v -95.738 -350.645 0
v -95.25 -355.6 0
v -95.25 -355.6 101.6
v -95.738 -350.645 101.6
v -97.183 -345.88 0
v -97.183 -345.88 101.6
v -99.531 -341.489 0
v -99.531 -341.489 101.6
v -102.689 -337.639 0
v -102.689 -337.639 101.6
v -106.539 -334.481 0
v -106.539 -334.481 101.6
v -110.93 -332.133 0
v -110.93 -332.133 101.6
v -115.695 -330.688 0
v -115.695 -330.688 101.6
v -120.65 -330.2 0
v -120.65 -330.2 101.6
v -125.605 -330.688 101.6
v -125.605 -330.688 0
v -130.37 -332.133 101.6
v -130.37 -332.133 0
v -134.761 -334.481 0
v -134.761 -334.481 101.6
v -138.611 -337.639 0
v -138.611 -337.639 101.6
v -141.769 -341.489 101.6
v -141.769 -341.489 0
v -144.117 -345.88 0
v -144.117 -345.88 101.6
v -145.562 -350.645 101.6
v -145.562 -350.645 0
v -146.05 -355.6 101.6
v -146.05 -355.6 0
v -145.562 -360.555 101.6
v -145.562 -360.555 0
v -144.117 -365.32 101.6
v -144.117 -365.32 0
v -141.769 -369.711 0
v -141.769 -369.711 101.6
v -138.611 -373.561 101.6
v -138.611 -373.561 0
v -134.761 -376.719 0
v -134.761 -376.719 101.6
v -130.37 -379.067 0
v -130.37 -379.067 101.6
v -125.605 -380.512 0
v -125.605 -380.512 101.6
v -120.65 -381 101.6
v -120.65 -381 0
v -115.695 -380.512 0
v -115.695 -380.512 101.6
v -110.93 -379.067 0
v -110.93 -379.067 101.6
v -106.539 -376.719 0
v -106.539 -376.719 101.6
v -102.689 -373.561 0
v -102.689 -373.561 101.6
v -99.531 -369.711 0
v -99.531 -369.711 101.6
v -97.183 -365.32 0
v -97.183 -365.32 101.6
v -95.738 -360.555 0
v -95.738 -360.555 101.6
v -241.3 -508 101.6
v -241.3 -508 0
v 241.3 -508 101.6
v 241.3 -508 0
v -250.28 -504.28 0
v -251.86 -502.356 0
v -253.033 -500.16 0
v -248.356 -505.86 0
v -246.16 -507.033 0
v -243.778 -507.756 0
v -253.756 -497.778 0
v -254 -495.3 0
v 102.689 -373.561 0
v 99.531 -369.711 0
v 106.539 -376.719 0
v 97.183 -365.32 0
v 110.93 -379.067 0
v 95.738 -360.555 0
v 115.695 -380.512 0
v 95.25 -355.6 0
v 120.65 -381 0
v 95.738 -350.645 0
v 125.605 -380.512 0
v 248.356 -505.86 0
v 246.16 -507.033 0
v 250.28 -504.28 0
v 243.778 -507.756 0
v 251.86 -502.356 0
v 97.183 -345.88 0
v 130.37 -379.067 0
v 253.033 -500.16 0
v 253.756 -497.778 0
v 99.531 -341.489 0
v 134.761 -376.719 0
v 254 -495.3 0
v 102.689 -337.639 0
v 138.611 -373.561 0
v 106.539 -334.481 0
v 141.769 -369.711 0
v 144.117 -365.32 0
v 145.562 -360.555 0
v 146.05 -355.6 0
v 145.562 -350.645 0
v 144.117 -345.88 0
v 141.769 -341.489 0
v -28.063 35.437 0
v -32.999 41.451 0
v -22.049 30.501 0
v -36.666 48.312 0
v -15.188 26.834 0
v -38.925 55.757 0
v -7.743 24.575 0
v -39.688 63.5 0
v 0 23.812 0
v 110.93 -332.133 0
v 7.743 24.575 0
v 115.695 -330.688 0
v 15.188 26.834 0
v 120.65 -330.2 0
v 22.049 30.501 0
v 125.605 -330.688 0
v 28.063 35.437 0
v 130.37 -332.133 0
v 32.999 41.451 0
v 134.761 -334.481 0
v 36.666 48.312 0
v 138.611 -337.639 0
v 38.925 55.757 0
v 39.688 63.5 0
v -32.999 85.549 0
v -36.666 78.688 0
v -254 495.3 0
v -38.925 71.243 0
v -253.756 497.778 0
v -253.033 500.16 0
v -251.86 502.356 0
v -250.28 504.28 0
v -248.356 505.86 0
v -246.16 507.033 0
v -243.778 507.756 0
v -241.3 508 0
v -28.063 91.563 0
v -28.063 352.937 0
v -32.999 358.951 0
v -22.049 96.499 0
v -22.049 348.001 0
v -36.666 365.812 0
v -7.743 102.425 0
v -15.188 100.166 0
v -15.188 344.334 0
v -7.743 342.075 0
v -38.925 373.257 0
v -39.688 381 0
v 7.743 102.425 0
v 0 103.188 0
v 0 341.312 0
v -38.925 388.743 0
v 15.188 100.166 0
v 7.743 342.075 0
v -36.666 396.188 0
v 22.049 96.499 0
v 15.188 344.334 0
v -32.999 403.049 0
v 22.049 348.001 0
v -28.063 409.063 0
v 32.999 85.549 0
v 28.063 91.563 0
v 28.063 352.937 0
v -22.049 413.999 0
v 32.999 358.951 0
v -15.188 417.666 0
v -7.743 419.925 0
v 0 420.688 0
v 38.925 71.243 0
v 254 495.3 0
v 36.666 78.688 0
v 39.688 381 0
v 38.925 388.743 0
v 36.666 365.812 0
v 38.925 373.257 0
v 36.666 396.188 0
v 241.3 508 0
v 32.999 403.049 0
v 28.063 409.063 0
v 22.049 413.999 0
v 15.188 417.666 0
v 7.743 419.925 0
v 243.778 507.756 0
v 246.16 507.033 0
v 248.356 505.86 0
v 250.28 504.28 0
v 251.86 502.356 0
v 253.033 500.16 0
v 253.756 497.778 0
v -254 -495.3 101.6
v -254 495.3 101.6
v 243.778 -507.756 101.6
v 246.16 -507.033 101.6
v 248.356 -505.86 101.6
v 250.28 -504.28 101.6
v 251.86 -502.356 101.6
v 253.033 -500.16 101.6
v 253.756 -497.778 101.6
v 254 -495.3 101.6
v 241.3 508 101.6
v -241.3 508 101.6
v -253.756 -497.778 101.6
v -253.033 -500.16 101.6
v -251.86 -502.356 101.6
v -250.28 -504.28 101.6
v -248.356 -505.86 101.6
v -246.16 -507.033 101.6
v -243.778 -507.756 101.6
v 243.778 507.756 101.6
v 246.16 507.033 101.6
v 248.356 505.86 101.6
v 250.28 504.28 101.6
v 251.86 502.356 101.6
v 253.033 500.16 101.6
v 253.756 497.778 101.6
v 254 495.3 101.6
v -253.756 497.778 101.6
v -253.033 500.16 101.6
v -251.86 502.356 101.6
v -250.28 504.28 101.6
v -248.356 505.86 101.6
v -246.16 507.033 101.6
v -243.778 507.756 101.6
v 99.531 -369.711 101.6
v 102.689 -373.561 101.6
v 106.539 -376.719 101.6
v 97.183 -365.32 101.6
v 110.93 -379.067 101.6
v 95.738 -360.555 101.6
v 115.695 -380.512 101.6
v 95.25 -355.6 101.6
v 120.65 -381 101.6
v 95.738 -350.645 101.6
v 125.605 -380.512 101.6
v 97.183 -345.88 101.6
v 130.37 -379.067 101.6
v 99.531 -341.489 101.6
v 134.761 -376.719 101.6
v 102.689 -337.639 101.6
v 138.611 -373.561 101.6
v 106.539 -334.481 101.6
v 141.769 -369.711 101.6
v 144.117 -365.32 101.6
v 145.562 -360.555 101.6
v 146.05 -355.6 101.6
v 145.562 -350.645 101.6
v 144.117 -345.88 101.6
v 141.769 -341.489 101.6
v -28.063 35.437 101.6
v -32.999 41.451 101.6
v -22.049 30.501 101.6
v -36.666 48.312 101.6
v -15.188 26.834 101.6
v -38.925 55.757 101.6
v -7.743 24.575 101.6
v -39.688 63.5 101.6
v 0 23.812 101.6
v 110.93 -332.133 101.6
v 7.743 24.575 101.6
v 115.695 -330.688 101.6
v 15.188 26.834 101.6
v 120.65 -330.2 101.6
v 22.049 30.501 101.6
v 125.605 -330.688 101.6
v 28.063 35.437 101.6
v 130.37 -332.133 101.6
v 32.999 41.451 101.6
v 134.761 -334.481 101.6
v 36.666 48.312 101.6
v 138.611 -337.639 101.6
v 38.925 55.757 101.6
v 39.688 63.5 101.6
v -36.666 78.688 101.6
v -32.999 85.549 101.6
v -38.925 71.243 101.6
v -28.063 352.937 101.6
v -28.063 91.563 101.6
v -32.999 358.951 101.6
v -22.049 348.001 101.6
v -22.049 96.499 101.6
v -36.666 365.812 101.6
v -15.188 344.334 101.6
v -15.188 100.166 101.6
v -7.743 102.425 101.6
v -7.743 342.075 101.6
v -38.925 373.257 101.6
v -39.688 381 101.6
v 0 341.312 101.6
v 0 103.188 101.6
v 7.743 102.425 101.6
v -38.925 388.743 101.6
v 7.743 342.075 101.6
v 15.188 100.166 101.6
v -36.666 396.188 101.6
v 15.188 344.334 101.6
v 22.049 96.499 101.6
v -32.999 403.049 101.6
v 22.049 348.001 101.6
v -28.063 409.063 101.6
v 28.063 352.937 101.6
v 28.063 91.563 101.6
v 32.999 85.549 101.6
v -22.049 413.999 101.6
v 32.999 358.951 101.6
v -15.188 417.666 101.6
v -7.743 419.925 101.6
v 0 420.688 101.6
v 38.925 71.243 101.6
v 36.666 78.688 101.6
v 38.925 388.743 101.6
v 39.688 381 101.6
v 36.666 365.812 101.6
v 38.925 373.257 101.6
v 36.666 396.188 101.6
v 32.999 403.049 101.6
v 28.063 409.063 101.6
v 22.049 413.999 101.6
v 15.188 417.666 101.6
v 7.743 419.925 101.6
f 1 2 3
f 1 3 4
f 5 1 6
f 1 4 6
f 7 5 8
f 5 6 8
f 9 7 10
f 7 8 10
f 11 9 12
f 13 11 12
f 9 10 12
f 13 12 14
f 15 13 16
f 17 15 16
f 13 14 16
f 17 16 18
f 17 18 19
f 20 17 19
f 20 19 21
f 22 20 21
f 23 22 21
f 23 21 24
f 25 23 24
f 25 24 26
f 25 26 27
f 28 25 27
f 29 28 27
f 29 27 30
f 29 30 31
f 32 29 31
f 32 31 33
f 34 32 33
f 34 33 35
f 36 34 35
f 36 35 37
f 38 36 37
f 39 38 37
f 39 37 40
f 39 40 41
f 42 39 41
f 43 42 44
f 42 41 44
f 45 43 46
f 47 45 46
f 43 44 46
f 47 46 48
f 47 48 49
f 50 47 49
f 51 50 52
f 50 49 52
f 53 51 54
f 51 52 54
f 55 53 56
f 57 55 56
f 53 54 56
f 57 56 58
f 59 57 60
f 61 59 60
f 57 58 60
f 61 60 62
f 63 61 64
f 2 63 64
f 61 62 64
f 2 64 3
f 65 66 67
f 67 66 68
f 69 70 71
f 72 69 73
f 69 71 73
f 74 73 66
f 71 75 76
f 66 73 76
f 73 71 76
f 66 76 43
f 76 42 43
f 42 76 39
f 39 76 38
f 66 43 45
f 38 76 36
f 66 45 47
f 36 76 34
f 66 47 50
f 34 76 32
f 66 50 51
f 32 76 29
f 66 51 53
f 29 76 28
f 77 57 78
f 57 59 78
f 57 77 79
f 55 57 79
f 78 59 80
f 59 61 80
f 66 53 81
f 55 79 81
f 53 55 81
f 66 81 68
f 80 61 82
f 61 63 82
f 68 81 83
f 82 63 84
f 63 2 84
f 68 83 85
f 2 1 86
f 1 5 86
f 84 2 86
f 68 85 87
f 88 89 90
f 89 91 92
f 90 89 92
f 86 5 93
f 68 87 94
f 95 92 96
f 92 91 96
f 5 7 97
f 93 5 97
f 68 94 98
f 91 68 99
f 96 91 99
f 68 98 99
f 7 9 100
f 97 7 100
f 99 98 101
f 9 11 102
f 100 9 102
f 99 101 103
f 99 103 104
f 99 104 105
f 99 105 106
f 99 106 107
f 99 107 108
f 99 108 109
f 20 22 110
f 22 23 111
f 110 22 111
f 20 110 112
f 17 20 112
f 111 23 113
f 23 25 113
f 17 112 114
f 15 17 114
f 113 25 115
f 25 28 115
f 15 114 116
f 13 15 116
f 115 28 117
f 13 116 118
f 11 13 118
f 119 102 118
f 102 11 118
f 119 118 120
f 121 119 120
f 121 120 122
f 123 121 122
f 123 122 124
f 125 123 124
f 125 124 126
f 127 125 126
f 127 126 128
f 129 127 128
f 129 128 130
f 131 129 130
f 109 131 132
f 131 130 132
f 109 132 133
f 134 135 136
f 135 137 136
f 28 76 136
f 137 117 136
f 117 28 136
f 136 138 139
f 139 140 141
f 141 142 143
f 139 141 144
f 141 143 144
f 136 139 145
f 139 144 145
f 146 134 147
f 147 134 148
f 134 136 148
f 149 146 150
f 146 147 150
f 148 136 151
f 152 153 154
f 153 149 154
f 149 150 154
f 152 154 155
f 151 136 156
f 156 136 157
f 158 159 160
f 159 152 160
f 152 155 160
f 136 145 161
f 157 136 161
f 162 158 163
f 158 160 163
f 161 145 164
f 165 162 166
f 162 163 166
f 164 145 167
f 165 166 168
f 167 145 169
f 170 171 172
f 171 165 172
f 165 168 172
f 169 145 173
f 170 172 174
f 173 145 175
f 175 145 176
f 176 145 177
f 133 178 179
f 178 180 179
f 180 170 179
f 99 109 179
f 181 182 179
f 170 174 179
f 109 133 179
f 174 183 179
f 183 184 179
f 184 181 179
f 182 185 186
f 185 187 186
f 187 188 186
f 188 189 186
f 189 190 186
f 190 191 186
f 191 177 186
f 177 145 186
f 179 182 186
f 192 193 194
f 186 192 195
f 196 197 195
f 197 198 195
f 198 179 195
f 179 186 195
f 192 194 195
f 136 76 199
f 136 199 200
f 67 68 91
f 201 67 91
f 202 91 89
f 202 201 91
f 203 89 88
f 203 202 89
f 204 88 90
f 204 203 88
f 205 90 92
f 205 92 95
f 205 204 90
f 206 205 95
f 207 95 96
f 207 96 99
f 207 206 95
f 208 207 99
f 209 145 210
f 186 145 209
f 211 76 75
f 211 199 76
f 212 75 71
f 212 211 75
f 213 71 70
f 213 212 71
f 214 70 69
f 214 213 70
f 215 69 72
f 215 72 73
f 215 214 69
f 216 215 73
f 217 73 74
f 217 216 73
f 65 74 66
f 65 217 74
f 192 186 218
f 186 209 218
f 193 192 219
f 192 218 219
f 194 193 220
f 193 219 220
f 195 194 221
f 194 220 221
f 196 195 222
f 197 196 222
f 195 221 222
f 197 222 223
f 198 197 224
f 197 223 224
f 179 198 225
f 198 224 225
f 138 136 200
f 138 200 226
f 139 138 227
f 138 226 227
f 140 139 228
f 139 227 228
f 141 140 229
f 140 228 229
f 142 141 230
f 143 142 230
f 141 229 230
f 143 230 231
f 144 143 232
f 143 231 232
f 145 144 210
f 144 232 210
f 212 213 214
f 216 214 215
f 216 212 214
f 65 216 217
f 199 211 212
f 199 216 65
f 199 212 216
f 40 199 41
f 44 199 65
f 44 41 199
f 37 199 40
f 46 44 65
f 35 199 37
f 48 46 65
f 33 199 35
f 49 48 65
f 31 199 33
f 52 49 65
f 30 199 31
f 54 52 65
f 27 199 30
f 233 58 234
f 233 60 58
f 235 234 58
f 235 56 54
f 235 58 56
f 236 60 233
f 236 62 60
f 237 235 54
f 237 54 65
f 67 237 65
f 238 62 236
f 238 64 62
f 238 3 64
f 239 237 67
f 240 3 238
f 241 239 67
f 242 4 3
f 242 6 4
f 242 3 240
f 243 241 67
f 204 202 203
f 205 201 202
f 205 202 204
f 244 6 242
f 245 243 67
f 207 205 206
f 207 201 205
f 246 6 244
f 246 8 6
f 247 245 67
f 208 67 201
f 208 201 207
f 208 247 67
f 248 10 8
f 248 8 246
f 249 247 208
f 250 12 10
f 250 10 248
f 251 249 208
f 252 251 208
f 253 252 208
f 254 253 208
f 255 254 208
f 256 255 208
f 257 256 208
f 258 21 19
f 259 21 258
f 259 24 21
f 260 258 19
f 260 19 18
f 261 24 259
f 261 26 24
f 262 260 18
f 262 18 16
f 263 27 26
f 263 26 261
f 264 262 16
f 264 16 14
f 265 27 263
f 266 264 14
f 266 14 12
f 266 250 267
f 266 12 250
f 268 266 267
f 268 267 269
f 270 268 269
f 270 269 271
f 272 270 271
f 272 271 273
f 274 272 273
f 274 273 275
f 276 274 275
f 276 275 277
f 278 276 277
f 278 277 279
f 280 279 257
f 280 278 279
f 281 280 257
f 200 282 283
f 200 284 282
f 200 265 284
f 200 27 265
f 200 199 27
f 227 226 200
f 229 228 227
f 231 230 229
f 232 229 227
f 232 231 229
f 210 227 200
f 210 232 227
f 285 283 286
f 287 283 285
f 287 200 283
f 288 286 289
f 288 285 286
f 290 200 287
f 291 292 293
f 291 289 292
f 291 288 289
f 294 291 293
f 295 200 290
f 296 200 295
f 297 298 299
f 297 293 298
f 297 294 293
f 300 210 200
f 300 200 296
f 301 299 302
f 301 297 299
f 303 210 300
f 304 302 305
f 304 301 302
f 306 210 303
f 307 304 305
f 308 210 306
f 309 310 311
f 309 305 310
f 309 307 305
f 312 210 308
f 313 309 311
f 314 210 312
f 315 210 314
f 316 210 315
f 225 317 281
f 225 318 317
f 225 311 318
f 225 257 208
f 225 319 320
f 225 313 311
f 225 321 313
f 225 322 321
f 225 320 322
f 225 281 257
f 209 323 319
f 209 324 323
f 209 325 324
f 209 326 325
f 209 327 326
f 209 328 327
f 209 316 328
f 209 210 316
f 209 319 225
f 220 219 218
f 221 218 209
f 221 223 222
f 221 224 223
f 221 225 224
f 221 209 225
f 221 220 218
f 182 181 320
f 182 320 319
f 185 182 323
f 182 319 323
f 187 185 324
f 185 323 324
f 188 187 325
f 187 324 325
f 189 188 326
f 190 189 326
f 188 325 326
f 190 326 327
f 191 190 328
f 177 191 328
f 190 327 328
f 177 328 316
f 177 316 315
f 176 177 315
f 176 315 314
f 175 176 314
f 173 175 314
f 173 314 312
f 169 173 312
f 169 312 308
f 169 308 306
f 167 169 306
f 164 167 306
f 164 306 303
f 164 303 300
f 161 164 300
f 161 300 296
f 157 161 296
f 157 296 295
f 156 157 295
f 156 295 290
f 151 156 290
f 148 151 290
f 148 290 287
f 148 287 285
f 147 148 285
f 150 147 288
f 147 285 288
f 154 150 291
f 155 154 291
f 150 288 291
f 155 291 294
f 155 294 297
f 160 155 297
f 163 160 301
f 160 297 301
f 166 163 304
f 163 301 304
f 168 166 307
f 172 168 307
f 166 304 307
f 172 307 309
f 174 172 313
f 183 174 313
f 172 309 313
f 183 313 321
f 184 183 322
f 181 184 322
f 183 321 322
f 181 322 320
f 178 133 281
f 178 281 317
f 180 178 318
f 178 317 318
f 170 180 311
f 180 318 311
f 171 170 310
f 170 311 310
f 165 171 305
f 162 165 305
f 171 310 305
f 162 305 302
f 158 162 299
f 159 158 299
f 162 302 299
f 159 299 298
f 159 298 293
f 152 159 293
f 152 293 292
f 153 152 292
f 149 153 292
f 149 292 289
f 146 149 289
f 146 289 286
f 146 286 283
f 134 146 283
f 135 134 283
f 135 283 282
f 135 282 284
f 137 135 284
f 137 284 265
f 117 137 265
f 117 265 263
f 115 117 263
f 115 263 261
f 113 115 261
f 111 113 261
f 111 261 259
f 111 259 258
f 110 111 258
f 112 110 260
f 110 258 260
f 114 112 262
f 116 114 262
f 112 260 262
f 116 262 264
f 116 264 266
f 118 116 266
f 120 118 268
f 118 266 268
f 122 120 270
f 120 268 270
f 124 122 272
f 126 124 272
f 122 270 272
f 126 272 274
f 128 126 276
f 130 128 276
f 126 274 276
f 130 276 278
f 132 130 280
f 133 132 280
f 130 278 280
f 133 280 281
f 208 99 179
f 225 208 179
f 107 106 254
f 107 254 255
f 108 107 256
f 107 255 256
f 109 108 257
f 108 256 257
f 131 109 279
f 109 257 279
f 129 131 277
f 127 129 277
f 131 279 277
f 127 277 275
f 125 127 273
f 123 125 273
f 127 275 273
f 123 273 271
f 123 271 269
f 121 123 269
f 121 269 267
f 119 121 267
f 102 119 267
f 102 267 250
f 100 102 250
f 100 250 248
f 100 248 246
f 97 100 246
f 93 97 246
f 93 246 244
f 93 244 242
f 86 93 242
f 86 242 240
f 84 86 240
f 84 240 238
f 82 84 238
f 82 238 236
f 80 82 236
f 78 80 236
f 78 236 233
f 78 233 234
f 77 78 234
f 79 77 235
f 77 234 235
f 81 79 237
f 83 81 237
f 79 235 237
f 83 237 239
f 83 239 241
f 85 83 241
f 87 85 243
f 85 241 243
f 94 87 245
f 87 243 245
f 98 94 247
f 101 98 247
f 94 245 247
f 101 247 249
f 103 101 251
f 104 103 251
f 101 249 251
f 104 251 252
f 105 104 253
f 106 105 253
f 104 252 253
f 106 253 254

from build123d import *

# Parameters (mm, degrees)
F0_W     = 508
F0_H     = 1016
F1_DEPTH = 101.6
F2_R     = 25.4
F2_R_2   = 39.6875
F3_DEPTH = 101.601
F4_R     = 12.7


with BuildPart() as f1:
    # F0 (on Top) → F1 (new body)
    with BuildSketch(Plane.XY):
        Rectangle(F0_W, F0_H)
    extrude(amount=F1_DEPTH)

    # F2 (on face) → F3 (cut, through all)
    with BuildSketch(Plane.XY.offset(101.6)):
        with Locations((-120.65, -355.6)):
            Circle(F2_R)
        with Locations((120.65, -355.6)):
            Circle(F2_R)
        with Locations((0, 63.5)):
            Circle(F2_R_2)
        with Locations((0, 381)):
            Circle(F2_R_2)
    extrude(amount=-F3_DEPTH, mode=Mode.SUBTRACT)

    # F4
    f4_edges = [f1.edges().sort_by_distance(p)[0] for p in [
        (-254, -508, 50.8),
        (254, -508, 50.8),
        (254, 508, 50.8),
        (-254, 508, 50.8),
    ]]
    fillet(f4_edges, radius=F4_R)


solid = f1.part
